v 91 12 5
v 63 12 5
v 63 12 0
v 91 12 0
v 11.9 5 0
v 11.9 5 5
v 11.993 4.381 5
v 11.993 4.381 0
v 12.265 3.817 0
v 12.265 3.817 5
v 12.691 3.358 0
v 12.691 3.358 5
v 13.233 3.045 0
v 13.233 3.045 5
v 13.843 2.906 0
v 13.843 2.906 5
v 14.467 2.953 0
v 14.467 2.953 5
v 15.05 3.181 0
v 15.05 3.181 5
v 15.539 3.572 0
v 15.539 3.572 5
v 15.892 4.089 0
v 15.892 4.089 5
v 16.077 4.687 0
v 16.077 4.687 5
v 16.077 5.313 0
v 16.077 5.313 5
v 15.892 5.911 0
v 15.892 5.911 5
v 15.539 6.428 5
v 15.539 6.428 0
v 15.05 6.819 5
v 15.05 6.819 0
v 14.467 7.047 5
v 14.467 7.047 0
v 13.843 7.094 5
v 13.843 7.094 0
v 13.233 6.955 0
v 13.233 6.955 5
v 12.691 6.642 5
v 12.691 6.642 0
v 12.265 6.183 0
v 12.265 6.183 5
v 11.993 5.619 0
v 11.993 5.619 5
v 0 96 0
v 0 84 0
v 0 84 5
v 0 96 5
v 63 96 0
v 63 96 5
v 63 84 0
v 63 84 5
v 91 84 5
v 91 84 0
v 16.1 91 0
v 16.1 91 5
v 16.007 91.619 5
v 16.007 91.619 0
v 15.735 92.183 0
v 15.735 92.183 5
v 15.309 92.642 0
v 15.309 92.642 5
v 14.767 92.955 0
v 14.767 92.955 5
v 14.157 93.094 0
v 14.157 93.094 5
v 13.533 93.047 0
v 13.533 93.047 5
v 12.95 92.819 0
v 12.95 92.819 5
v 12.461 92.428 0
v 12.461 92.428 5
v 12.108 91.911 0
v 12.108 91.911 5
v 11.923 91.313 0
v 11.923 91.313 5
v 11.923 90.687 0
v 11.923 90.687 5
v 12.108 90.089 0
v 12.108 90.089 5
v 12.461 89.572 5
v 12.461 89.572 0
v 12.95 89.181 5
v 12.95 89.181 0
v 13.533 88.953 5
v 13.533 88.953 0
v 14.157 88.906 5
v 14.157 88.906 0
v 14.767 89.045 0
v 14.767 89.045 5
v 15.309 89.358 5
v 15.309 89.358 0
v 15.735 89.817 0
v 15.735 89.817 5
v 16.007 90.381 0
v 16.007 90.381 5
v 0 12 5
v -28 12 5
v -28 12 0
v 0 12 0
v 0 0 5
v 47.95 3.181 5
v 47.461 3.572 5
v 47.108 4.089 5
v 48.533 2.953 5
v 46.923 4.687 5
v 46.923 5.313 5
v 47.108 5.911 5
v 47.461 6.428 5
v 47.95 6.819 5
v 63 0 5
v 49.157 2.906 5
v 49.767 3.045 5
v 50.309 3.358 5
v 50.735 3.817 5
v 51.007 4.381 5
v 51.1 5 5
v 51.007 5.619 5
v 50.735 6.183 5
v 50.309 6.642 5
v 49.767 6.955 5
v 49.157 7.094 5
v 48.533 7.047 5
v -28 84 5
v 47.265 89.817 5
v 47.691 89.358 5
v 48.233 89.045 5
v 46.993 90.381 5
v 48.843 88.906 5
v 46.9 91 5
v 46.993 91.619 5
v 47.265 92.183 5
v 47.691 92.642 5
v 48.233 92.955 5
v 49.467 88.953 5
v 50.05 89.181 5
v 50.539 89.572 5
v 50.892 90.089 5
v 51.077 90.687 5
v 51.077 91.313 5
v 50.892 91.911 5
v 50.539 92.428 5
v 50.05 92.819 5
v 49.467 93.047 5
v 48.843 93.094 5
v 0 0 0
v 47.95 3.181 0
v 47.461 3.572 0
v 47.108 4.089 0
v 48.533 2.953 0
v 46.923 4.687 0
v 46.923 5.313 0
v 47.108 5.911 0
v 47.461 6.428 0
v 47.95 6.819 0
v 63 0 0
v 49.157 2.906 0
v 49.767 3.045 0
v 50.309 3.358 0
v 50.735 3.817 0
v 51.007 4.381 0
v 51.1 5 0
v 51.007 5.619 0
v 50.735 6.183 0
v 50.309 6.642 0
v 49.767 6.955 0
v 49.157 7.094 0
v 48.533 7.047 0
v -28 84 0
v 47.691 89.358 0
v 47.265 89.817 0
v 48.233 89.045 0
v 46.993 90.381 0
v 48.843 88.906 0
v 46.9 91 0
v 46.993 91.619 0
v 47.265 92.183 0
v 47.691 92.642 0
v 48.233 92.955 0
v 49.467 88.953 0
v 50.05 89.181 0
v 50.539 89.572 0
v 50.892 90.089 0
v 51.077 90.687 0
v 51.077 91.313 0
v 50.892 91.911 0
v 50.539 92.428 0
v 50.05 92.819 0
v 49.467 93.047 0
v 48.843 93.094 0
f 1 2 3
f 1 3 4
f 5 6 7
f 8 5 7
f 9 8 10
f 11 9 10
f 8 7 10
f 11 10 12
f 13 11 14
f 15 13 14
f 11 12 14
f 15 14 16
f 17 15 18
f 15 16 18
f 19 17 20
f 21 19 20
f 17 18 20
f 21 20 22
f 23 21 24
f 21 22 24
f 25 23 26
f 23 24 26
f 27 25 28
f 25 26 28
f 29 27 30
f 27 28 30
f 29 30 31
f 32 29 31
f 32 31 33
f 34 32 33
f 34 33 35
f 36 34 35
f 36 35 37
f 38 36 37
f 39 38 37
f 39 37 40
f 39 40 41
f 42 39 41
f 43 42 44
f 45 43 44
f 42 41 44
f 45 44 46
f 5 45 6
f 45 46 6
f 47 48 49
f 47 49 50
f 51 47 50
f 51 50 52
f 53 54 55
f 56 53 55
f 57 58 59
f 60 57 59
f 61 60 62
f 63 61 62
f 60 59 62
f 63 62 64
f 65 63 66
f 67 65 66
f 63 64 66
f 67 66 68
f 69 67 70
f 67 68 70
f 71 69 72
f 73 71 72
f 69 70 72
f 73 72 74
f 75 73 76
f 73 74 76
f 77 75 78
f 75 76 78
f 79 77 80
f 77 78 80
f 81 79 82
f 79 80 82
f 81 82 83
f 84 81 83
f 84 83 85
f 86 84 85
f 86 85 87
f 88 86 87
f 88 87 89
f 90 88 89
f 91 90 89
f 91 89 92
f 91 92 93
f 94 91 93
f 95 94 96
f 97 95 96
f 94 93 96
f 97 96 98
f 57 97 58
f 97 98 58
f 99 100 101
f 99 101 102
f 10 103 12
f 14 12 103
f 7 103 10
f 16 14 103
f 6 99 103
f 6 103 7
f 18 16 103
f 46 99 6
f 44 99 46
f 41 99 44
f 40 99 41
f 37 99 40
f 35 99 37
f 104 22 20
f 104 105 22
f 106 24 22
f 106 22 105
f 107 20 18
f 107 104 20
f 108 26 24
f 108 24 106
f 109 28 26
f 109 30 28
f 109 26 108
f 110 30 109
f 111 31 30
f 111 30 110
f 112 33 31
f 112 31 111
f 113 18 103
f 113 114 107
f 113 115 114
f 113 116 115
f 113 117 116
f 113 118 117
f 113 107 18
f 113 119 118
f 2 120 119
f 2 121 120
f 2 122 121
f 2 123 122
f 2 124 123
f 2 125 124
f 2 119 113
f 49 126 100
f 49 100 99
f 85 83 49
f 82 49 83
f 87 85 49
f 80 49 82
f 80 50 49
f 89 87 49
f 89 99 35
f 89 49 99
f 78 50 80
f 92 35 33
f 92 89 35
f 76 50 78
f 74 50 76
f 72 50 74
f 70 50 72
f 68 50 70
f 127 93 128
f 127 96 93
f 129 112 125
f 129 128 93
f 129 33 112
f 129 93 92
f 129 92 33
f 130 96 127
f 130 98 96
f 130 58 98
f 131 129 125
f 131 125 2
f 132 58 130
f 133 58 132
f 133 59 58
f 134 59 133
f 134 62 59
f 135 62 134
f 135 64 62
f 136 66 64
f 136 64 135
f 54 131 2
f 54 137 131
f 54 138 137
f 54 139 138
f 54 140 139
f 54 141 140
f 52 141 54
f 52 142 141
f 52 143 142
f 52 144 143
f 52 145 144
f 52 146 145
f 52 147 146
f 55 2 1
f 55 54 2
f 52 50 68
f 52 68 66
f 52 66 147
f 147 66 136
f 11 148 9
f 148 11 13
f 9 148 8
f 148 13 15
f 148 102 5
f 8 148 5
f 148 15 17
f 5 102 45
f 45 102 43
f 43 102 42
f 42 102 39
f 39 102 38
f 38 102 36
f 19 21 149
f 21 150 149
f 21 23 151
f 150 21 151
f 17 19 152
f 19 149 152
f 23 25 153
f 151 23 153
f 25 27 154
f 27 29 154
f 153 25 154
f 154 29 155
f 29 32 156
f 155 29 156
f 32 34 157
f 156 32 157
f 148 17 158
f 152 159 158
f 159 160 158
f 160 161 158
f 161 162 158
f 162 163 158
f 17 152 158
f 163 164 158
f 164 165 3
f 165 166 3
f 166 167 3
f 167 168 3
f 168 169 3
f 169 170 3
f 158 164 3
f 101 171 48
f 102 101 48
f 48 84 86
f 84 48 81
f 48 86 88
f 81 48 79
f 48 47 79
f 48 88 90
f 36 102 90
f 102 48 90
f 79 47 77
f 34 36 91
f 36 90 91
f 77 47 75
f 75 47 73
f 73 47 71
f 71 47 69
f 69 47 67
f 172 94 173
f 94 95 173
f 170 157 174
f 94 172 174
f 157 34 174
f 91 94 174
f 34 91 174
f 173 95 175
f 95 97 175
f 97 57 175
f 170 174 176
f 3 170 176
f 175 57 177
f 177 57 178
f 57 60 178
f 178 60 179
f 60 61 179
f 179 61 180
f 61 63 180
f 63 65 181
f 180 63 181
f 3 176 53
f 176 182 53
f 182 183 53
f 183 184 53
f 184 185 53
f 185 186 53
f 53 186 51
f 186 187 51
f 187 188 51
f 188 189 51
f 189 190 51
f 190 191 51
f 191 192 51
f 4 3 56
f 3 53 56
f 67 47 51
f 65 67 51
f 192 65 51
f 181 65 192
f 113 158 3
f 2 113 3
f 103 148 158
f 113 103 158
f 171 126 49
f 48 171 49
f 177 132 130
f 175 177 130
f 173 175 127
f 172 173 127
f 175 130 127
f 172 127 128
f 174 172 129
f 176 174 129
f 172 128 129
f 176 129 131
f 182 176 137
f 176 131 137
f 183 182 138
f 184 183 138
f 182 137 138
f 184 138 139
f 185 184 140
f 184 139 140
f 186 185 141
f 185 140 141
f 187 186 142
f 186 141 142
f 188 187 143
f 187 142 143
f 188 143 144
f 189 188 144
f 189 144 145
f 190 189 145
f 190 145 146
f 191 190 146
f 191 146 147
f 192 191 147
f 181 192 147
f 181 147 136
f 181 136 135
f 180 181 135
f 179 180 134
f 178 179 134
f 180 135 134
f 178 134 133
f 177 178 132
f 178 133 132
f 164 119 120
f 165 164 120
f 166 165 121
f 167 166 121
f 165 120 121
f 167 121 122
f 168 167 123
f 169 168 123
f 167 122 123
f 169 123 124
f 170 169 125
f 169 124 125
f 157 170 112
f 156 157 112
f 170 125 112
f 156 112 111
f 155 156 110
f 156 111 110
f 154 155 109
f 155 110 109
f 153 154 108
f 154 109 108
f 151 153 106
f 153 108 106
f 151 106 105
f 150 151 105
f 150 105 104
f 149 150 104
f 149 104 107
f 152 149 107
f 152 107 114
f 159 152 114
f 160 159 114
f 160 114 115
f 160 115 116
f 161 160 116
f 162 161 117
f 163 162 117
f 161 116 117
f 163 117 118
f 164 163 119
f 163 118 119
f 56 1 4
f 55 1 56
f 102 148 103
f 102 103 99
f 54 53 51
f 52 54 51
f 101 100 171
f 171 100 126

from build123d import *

# Parameters (mm, degrees)
SKETCH2_W           = 63
SKETCH2_H           = 96
BOSS_EXTRUDE1_DEPTH = 5
SKETCH3_R           = 2.1
CUT_EXTRUDE1_DEPTH  = 5
SKETCH4_W           = 28
SKETCH4_H           = 72
BOSS_EXTRUDE2_DEPTH = 5


with BuildPart() as part:
    # Sketch2 → Boss-Extrude1 (new body)
    with BuildSketch(Plane.XY):
        with Locations((31.5, 48)):
            Rectangle(SKETCH2_W, SKETCH2_H)
    extrude(amount=BOSS_EXTRUDE1_DEPTH)

    # Sketch3 → Cut-Extrude1 (cut)
    with BuildSketch(Plane.XY.offset(5)):
        with Locations((14, 91)):
            Circle(SKETCH3_R)
        with Locations(Location((49, 91, 0), (0, 0, 180))):
            Circle(SKETCH3_R)
        with Locations((49, 5)):
            Circle(SKETCH3_R)
        with Locations(Location((14, 5, 0), (0, 0, 180))):
            Circle(SKETCH3_R)
    extrude(amount=-CUT_EXTRUDE1_DEPTH, mode=Mode.SUBTRACT)

    # Sketch4 → Boss-Extrude2 (add)
    with BuildSketch(Plane.XY.offset(5)):
        with Locations((77, 48)):
            Rectangle(SKETCH4_W, SKETCH4_H)
        with Locations((-14, 48)):
            Rectangle(SKETCH4_W, SKETCH4_H)
    extrude(amount=-BOSS_EXTRUDE2_DEPTH)


solid = part.part
